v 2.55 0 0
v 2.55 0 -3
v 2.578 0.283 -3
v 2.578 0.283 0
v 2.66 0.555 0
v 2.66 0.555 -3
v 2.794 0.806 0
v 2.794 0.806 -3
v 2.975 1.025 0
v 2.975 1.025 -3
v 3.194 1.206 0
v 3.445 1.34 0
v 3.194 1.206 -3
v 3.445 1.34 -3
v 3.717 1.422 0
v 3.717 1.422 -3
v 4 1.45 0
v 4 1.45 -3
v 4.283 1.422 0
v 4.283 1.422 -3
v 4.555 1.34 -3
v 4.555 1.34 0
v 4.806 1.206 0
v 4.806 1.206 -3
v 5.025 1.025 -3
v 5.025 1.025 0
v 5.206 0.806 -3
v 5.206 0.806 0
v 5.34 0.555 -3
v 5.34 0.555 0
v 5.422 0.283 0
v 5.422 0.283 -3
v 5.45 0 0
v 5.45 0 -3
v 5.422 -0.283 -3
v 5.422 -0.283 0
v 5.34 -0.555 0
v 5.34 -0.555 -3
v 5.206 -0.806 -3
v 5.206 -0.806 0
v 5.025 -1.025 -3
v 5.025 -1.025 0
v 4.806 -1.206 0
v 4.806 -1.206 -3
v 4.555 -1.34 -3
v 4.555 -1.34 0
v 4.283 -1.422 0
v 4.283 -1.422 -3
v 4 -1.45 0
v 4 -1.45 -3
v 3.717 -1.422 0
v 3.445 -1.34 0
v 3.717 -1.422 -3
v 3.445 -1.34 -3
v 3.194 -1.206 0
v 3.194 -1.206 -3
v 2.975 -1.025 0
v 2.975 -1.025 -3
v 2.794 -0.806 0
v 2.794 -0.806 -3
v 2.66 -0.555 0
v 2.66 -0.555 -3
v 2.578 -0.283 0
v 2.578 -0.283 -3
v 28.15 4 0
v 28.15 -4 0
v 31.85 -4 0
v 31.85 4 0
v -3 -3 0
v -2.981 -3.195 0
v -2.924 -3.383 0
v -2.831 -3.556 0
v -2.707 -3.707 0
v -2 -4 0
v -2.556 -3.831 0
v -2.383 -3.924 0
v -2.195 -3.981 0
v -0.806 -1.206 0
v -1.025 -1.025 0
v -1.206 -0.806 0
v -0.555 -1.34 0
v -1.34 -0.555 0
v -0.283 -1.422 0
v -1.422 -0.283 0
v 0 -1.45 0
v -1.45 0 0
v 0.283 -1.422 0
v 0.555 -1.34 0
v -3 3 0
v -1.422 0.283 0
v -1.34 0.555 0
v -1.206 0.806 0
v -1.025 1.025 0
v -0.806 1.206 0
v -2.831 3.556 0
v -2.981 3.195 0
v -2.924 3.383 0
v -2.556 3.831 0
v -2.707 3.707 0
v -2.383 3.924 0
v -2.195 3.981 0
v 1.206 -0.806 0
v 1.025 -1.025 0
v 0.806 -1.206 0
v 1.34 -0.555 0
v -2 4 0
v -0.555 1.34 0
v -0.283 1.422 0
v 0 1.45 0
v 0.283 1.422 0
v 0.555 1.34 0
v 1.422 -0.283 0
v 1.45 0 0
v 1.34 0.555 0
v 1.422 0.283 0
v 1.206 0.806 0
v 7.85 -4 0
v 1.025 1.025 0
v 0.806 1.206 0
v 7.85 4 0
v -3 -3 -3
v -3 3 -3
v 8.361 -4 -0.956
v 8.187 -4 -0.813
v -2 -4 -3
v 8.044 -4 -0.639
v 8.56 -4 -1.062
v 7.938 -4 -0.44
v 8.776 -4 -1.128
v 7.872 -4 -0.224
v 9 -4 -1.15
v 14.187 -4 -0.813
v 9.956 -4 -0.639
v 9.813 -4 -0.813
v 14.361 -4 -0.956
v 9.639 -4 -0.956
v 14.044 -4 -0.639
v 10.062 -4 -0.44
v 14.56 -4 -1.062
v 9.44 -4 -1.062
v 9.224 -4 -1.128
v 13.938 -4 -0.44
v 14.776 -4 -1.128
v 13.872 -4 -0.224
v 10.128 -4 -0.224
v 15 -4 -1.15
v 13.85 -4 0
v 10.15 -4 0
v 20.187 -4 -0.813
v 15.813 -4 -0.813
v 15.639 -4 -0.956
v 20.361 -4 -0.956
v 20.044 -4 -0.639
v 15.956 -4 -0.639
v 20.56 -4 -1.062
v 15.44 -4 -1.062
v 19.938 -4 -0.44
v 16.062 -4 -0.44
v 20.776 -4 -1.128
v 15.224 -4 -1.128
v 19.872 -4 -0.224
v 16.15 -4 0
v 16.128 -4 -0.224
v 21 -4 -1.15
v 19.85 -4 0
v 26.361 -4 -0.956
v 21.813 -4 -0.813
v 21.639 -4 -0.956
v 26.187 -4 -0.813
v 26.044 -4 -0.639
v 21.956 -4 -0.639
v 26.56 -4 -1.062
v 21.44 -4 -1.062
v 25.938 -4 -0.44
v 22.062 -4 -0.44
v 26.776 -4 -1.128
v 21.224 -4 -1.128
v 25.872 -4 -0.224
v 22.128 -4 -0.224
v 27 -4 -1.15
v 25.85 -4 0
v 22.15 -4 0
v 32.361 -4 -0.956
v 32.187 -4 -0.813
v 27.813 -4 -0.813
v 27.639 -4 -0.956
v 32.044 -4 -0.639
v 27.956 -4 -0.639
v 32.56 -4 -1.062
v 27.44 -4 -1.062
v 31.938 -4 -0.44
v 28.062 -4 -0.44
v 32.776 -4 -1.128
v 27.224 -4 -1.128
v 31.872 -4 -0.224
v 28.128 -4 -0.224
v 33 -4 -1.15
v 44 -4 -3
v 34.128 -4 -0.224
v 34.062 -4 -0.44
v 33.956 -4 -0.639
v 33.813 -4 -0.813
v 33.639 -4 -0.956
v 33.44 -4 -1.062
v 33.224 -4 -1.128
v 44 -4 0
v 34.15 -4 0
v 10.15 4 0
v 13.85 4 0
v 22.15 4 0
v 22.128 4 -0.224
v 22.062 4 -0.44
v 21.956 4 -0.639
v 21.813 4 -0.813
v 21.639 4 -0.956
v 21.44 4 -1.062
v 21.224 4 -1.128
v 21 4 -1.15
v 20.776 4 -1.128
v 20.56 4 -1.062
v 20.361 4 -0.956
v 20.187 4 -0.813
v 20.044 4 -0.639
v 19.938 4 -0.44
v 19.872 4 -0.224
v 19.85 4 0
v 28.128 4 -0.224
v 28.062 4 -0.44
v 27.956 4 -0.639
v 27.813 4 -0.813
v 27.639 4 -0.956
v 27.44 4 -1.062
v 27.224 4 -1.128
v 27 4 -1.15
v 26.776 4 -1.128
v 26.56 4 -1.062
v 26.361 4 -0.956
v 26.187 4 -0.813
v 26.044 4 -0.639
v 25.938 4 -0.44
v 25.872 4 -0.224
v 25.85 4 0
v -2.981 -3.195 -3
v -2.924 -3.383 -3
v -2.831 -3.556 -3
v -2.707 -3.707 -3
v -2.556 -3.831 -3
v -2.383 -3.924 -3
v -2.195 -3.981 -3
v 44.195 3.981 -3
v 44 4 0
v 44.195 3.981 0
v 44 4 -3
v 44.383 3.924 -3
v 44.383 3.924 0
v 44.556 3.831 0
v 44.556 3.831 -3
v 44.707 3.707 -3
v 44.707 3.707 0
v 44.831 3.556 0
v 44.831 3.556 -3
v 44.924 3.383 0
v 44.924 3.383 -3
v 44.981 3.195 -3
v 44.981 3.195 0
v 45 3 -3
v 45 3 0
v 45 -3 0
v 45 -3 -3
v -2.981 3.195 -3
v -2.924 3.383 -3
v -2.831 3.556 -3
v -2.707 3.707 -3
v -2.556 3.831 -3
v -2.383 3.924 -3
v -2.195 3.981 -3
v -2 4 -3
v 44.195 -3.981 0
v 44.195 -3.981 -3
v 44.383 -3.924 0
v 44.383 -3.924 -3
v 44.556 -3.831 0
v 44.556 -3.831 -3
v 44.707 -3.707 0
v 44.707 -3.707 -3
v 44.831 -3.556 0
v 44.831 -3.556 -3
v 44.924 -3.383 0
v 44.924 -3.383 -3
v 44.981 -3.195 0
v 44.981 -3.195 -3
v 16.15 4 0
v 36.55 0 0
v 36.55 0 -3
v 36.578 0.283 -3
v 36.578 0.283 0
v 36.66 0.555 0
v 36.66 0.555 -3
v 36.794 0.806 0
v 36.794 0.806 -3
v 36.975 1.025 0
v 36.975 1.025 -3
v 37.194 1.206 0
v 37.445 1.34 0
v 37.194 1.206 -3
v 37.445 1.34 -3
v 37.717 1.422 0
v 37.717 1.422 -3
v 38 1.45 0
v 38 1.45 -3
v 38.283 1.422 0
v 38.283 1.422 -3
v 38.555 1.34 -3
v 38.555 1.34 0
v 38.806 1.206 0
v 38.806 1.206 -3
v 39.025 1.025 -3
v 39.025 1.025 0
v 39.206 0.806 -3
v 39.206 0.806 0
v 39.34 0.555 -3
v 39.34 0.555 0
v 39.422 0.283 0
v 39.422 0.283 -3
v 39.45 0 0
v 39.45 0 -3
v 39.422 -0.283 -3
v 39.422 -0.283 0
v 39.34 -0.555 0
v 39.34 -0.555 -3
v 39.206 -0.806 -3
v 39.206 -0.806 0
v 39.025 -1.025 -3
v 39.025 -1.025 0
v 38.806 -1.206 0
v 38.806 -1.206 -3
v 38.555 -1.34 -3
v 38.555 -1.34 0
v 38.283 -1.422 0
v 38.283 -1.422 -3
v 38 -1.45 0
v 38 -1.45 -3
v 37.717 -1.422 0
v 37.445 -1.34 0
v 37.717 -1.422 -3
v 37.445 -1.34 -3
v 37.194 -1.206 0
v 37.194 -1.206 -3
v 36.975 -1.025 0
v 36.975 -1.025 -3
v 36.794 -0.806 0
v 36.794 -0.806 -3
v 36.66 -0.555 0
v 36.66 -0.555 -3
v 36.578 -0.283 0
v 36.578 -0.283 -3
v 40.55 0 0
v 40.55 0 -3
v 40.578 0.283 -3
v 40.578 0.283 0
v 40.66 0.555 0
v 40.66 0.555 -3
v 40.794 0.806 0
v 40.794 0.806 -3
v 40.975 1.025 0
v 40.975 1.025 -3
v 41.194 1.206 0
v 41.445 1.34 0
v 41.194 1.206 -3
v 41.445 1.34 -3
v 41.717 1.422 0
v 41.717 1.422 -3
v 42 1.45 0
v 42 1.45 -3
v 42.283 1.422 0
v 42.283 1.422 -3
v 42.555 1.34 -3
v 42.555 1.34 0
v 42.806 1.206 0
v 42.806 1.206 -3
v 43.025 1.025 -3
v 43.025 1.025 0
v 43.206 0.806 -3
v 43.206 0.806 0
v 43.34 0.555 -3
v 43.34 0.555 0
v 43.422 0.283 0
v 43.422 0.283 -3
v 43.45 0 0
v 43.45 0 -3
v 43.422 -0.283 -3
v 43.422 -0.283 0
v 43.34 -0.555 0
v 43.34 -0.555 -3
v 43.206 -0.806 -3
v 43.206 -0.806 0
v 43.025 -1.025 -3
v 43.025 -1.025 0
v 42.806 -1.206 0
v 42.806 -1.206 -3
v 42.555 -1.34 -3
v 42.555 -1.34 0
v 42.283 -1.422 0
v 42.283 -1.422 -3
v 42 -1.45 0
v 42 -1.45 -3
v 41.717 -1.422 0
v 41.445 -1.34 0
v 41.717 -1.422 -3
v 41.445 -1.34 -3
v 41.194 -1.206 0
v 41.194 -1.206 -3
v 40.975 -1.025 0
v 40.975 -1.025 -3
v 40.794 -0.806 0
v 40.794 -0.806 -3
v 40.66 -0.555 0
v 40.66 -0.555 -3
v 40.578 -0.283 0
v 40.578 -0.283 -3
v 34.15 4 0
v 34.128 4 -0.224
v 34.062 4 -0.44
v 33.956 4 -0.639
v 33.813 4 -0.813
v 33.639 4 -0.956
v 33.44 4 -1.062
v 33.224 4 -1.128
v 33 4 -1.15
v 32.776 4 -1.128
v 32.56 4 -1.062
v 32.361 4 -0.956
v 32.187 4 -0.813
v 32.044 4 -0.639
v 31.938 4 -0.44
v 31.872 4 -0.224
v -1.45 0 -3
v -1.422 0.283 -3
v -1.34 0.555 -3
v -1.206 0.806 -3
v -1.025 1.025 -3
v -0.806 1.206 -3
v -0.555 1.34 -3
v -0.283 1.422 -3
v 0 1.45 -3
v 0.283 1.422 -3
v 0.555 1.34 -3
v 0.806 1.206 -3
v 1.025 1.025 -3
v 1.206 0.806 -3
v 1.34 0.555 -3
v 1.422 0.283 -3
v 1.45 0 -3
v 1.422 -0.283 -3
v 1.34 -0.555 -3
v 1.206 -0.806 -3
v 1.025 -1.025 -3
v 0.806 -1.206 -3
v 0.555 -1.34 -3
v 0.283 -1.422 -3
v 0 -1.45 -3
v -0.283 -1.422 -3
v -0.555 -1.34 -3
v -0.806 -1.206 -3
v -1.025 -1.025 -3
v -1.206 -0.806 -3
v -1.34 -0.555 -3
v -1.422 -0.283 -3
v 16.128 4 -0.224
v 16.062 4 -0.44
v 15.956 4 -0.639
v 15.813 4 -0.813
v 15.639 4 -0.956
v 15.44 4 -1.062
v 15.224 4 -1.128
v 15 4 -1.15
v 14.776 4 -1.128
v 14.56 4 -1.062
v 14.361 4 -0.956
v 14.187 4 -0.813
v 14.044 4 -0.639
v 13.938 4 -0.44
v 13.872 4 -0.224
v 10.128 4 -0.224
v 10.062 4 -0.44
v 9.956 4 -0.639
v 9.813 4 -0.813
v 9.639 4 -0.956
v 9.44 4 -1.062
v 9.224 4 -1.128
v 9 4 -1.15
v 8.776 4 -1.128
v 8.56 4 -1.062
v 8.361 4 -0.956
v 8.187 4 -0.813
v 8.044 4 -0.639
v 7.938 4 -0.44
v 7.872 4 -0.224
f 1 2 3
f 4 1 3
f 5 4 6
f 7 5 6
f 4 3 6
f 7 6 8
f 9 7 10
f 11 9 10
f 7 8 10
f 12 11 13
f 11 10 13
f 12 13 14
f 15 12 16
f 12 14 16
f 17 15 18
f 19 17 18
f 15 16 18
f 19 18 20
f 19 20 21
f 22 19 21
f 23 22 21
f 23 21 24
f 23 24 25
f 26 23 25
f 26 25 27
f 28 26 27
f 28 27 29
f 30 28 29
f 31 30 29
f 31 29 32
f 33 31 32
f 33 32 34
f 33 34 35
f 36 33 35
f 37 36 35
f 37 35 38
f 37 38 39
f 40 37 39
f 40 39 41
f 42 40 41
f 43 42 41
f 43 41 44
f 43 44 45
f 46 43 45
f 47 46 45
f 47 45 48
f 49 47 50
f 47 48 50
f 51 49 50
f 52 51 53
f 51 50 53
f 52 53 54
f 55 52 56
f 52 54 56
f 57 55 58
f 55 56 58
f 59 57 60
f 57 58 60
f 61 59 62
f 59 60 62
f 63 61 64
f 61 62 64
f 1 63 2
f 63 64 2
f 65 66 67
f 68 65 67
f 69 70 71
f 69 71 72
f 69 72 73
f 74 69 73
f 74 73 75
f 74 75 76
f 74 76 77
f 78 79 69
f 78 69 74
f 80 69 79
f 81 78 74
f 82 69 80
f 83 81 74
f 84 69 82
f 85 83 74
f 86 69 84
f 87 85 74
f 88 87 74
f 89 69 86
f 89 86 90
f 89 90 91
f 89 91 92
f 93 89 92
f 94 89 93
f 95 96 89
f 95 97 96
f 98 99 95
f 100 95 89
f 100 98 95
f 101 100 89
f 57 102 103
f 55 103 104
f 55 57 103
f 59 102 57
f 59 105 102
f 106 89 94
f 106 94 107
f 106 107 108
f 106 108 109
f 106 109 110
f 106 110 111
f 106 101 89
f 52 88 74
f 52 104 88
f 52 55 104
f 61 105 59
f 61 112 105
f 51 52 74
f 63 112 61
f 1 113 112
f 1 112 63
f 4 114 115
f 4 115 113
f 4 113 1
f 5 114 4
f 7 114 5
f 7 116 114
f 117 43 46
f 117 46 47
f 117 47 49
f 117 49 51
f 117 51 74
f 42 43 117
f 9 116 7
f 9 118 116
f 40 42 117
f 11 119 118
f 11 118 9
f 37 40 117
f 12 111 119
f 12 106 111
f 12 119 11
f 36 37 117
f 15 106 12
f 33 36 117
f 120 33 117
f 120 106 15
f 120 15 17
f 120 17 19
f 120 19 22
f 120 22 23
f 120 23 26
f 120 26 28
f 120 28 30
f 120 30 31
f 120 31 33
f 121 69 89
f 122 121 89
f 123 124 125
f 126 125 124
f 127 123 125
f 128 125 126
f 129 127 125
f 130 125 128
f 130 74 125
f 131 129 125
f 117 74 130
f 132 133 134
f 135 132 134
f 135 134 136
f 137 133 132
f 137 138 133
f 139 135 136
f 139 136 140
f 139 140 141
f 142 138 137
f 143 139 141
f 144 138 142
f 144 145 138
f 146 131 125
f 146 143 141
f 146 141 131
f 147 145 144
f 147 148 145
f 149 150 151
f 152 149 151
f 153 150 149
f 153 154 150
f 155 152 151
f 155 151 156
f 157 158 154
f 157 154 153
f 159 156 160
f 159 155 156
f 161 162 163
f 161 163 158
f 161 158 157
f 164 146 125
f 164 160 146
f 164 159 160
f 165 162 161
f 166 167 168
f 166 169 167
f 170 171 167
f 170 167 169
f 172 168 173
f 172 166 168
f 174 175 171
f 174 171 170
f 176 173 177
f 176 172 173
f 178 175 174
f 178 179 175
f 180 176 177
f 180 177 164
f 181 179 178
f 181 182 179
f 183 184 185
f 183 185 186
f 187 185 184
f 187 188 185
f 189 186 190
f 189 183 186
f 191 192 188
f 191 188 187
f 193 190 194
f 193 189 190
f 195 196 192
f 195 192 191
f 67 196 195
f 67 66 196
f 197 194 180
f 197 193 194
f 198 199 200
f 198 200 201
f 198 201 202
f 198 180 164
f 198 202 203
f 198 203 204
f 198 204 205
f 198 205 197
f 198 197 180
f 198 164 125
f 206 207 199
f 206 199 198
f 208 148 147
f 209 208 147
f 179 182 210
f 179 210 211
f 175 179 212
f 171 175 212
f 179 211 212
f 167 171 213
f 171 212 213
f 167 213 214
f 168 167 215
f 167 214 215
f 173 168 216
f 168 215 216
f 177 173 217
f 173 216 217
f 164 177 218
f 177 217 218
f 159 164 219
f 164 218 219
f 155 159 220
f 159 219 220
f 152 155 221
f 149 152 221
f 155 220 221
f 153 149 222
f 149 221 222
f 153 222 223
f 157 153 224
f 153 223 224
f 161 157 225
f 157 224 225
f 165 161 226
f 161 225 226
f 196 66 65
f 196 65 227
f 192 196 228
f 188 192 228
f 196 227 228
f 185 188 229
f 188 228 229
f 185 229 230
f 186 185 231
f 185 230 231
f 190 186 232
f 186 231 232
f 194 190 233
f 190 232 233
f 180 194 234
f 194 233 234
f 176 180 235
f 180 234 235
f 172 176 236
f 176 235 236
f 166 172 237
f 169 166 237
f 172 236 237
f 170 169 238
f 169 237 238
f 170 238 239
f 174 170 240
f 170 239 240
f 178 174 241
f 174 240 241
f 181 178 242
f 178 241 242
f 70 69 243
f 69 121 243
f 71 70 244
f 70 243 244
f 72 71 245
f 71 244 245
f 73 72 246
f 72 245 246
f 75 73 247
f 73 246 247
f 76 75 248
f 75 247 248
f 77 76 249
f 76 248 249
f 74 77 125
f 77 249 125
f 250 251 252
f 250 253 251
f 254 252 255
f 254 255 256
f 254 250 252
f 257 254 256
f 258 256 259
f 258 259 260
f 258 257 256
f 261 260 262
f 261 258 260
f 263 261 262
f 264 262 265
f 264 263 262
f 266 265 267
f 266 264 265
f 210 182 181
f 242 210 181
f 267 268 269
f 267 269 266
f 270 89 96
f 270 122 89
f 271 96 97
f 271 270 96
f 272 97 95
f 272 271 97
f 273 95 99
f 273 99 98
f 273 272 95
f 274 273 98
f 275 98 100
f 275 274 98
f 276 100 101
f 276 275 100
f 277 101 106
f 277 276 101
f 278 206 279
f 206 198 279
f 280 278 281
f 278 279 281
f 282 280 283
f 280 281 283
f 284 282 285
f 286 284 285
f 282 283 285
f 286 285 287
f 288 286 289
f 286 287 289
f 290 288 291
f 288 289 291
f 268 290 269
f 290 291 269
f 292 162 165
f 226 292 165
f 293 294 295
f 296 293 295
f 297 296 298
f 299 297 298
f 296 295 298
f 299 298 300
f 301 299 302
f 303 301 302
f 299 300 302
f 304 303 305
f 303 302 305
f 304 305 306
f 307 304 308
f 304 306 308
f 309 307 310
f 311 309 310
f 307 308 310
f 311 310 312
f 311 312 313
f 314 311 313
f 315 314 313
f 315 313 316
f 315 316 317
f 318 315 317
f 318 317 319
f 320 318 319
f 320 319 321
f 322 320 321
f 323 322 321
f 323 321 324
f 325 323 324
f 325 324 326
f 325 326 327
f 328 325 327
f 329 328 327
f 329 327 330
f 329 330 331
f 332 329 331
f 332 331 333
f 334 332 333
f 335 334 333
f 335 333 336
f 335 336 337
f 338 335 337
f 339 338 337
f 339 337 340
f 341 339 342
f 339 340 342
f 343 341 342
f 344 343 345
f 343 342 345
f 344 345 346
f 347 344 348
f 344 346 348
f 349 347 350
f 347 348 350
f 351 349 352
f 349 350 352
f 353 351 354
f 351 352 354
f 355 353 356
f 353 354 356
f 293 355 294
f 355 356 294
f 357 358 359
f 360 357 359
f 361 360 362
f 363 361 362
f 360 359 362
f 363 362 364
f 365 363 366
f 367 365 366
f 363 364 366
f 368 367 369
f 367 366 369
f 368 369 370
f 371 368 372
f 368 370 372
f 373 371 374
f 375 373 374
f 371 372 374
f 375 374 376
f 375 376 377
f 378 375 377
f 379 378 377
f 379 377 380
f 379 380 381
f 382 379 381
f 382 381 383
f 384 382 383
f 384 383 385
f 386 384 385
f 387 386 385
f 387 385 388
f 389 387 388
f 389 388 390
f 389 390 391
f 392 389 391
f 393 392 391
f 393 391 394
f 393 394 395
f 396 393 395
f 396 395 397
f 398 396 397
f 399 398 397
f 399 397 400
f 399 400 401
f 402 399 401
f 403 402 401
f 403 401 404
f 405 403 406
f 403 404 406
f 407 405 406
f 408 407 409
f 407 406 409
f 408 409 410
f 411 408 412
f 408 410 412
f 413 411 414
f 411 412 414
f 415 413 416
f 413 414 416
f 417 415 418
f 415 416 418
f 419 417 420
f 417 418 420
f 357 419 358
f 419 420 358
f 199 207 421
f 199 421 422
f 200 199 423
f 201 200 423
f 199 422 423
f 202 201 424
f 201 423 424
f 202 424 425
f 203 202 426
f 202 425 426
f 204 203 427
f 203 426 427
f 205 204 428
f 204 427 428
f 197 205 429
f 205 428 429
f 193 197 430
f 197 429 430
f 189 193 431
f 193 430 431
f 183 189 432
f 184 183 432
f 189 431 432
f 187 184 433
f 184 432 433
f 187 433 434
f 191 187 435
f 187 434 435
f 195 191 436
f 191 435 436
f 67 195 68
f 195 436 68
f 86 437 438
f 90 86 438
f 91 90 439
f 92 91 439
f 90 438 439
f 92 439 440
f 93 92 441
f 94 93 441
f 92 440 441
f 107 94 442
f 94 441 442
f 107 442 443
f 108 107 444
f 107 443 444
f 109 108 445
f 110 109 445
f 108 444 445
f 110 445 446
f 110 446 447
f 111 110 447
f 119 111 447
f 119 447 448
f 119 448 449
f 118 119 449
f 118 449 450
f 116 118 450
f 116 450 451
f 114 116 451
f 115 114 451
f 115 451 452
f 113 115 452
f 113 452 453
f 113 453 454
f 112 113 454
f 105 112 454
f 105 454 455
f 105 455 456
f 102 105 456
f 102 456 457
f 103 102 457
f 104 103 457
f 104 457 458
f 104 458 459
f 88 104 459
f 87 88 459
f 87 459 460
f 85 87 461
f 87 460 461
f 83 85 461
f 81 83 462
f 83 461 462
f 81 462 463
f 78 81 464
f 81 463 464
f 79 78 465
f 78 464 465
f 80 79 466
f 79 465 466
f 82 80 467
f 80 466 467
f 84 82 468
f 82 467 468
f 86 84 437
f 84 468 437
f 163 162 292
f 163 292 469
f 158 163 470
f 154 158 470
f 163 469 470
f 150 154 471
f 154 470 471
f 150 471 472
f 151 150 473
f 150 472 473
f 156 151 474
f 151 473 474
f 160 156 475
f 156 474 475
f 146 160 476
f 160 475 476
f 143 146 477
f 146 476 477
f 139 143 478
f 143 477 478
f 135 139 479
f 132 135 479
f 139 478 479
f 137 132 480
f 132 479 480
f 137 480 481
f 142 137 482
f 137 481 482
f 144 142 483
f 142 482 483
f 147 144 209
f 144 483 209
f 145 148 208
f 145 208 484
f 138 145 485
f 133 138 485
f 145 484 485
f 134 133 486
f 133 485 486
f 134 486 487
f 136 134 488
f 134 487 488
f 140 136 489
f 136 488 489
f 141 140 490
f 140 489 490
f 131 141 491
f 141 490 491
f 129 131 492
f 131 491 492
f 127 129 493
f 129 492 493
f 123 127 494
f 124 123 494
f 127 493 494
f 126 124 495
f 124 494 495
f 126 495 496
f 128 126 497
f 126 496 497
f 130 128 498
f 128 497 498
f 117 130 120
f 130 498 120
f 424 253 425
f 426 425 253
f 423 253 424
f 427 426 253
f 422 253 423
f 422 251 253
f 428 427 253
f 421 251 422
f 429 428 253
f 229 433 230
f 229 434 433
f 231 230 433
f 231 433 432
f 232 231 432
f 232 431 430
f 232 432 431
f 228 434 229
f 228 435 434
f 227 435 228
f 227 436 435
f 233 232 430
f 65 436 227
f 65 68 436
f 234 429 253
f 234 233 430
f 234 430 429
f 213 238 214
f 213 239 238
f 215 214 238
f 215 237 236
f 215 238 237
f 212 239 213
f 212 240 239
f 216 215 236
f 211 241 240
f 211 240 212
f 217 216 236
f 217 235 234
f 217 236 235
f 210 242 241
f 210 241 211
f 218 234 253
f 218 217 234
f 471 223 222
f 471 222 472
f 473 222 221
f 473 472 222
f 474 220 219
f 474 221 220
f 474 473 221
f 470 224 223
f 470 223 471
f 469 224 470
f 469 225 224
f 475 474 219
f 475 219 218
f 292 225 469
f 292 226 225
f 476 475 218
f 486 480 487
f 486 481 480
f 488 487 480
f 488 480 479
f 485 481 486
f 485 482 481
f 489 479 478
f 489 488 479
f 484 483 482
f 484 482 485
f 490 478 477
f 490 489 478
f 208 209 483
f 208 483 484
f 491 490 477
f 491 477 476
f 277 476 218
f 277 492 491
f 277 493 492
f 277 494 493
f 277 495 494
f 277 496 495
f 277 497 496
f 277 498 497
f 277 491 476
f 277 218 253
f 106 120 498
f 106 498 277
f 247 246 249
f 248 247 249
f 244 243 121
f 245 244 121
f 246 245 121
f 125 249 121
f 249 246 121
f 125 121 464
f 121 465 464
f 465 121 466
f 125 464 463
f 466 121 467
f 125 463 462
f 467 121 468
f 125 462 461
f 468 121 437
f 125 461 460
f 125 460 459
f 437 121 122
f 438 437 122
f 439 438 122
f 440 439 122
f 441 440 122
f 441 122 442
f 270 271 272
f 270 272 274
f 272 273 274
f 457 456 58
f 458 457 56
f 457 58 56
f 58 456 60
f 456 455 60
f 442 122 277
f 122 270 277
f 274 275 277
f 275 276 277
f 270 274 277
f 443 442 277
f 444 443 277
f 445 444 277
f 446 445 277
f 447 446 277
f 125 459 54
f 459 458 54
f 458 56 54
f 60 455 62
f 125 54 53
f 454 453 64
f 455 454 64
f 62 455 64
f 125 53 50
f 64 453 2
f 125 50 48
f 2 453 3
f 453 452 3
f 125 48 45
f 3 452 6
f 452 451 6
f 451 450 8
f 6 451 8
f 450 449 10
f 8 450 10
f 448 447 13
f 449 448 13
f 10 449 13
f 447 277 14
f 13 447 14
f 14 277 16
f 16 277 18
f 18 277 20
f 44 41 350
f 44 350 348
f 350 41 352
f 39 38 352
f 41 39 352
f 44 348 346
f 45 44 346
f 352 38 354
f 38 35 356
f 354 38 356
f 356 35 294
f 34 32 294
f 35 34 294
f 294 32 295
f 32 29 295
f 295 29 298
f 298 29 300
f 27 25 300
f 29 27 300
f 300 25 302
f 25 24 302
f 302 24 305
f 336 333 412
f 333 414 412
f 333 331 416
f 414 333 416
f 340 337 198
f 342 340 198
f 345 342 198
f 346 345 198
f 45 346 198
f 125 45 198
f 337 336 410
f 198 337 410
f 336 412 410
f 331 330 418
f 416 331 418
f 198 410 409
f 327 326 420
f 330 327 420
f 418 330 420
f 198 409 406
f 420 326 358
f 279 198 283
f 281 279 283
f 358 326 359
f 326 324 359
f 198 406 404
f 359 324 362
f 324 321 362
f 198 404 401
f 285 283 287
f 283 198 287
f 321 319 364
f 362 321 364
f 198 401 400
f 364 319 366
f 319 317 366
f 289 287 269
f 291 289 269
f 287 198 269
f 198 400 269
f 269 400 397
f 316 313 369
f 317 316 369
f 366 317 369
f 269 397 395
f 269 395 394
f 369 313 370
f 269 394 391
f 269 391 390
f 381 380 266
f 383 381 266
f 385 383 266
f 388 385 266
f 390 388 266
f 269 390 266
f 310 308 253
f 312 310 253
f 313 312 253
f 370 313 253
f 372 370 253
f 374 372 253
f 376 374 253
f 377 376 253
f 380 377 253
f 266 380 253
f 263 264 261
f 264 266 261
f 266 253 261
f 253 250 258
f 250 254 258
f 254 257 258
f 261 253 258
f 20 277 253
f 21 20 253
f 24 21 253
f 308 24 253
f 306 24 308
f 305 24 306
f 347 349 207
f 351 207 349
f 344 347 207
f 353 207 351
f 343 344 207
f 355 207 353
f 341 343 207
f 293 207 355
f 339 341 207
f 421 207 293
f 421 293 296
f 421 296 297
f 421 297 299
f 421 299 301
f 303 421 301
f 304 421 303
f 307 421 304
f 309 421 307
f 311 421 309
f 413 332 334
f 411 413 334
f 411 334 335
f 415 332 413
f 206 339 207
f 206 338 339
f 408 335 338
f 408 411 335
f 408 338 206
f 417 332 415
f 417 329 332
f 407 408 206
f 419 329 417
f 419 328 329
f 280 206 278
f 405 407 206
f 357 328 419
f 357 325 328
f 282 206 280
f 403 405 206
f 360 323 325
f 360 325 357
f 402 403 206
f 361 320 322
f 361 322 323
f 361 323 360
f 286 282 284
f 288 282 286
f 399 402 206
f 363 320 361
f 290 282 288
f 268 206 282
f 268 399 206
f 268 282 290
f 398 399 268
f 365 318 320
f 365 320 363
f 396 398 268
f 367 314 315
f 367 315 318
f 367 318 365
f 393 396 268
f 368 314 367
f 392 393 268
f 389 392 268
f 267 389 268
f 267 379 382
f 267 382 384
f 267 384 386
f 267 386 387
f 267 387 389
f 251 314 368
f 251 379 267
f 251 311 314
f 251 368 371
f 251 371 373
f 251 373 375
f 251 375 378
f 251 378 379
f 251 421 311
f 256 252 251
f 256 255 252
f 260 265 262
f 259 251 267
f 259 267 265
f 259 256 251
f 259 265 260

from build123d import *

# Parameters (mm, degrees)
F0_W     = 6
F0_H     = 8
F0_W_2   = 36
F1_DEPTH = 3
F2_D     = 2.9
F4_D     = 2.3
F5_R     = 1


with BuildPart() as f1:
    # F0 (on Top) → F1 (new body)
    with BuildSketch(Plane.XY):
        Rectangle(F0_W, F0_H)
        with Locations((21, 0)):
            Rectangle(F0_W_2, F0_H)
        with Locations((42, 0)):
            Rectangle(F0_W, F0_H)
    extrude(amount=-F1_DEPTH)

    # F2 (through all)
    with Locations(Plane.XY):
        with Locations((0, 0), (4, 0), (38, 0), (42, 0)):
            Hole(F2_D / 2)

    # F4 (through all)
    with Locations(Plane.XZ.offset(4)):
        with Locations((9, 0), (15, 0), (21, 0), (27, 0), (33, 0)):
            Hole(F4_D / 2)

    # F5
    f5_edges = [f1.edges().sort_by_distance(p)[0] for p in [
        (-3, -4, -1.5),
        (45, -4, -1.5),
        (45, 4, -1.5),
        (-3, 4, -1.5),
    ]]
    fillet(f5_edges, radius=F5_R)


solid = f1.part
